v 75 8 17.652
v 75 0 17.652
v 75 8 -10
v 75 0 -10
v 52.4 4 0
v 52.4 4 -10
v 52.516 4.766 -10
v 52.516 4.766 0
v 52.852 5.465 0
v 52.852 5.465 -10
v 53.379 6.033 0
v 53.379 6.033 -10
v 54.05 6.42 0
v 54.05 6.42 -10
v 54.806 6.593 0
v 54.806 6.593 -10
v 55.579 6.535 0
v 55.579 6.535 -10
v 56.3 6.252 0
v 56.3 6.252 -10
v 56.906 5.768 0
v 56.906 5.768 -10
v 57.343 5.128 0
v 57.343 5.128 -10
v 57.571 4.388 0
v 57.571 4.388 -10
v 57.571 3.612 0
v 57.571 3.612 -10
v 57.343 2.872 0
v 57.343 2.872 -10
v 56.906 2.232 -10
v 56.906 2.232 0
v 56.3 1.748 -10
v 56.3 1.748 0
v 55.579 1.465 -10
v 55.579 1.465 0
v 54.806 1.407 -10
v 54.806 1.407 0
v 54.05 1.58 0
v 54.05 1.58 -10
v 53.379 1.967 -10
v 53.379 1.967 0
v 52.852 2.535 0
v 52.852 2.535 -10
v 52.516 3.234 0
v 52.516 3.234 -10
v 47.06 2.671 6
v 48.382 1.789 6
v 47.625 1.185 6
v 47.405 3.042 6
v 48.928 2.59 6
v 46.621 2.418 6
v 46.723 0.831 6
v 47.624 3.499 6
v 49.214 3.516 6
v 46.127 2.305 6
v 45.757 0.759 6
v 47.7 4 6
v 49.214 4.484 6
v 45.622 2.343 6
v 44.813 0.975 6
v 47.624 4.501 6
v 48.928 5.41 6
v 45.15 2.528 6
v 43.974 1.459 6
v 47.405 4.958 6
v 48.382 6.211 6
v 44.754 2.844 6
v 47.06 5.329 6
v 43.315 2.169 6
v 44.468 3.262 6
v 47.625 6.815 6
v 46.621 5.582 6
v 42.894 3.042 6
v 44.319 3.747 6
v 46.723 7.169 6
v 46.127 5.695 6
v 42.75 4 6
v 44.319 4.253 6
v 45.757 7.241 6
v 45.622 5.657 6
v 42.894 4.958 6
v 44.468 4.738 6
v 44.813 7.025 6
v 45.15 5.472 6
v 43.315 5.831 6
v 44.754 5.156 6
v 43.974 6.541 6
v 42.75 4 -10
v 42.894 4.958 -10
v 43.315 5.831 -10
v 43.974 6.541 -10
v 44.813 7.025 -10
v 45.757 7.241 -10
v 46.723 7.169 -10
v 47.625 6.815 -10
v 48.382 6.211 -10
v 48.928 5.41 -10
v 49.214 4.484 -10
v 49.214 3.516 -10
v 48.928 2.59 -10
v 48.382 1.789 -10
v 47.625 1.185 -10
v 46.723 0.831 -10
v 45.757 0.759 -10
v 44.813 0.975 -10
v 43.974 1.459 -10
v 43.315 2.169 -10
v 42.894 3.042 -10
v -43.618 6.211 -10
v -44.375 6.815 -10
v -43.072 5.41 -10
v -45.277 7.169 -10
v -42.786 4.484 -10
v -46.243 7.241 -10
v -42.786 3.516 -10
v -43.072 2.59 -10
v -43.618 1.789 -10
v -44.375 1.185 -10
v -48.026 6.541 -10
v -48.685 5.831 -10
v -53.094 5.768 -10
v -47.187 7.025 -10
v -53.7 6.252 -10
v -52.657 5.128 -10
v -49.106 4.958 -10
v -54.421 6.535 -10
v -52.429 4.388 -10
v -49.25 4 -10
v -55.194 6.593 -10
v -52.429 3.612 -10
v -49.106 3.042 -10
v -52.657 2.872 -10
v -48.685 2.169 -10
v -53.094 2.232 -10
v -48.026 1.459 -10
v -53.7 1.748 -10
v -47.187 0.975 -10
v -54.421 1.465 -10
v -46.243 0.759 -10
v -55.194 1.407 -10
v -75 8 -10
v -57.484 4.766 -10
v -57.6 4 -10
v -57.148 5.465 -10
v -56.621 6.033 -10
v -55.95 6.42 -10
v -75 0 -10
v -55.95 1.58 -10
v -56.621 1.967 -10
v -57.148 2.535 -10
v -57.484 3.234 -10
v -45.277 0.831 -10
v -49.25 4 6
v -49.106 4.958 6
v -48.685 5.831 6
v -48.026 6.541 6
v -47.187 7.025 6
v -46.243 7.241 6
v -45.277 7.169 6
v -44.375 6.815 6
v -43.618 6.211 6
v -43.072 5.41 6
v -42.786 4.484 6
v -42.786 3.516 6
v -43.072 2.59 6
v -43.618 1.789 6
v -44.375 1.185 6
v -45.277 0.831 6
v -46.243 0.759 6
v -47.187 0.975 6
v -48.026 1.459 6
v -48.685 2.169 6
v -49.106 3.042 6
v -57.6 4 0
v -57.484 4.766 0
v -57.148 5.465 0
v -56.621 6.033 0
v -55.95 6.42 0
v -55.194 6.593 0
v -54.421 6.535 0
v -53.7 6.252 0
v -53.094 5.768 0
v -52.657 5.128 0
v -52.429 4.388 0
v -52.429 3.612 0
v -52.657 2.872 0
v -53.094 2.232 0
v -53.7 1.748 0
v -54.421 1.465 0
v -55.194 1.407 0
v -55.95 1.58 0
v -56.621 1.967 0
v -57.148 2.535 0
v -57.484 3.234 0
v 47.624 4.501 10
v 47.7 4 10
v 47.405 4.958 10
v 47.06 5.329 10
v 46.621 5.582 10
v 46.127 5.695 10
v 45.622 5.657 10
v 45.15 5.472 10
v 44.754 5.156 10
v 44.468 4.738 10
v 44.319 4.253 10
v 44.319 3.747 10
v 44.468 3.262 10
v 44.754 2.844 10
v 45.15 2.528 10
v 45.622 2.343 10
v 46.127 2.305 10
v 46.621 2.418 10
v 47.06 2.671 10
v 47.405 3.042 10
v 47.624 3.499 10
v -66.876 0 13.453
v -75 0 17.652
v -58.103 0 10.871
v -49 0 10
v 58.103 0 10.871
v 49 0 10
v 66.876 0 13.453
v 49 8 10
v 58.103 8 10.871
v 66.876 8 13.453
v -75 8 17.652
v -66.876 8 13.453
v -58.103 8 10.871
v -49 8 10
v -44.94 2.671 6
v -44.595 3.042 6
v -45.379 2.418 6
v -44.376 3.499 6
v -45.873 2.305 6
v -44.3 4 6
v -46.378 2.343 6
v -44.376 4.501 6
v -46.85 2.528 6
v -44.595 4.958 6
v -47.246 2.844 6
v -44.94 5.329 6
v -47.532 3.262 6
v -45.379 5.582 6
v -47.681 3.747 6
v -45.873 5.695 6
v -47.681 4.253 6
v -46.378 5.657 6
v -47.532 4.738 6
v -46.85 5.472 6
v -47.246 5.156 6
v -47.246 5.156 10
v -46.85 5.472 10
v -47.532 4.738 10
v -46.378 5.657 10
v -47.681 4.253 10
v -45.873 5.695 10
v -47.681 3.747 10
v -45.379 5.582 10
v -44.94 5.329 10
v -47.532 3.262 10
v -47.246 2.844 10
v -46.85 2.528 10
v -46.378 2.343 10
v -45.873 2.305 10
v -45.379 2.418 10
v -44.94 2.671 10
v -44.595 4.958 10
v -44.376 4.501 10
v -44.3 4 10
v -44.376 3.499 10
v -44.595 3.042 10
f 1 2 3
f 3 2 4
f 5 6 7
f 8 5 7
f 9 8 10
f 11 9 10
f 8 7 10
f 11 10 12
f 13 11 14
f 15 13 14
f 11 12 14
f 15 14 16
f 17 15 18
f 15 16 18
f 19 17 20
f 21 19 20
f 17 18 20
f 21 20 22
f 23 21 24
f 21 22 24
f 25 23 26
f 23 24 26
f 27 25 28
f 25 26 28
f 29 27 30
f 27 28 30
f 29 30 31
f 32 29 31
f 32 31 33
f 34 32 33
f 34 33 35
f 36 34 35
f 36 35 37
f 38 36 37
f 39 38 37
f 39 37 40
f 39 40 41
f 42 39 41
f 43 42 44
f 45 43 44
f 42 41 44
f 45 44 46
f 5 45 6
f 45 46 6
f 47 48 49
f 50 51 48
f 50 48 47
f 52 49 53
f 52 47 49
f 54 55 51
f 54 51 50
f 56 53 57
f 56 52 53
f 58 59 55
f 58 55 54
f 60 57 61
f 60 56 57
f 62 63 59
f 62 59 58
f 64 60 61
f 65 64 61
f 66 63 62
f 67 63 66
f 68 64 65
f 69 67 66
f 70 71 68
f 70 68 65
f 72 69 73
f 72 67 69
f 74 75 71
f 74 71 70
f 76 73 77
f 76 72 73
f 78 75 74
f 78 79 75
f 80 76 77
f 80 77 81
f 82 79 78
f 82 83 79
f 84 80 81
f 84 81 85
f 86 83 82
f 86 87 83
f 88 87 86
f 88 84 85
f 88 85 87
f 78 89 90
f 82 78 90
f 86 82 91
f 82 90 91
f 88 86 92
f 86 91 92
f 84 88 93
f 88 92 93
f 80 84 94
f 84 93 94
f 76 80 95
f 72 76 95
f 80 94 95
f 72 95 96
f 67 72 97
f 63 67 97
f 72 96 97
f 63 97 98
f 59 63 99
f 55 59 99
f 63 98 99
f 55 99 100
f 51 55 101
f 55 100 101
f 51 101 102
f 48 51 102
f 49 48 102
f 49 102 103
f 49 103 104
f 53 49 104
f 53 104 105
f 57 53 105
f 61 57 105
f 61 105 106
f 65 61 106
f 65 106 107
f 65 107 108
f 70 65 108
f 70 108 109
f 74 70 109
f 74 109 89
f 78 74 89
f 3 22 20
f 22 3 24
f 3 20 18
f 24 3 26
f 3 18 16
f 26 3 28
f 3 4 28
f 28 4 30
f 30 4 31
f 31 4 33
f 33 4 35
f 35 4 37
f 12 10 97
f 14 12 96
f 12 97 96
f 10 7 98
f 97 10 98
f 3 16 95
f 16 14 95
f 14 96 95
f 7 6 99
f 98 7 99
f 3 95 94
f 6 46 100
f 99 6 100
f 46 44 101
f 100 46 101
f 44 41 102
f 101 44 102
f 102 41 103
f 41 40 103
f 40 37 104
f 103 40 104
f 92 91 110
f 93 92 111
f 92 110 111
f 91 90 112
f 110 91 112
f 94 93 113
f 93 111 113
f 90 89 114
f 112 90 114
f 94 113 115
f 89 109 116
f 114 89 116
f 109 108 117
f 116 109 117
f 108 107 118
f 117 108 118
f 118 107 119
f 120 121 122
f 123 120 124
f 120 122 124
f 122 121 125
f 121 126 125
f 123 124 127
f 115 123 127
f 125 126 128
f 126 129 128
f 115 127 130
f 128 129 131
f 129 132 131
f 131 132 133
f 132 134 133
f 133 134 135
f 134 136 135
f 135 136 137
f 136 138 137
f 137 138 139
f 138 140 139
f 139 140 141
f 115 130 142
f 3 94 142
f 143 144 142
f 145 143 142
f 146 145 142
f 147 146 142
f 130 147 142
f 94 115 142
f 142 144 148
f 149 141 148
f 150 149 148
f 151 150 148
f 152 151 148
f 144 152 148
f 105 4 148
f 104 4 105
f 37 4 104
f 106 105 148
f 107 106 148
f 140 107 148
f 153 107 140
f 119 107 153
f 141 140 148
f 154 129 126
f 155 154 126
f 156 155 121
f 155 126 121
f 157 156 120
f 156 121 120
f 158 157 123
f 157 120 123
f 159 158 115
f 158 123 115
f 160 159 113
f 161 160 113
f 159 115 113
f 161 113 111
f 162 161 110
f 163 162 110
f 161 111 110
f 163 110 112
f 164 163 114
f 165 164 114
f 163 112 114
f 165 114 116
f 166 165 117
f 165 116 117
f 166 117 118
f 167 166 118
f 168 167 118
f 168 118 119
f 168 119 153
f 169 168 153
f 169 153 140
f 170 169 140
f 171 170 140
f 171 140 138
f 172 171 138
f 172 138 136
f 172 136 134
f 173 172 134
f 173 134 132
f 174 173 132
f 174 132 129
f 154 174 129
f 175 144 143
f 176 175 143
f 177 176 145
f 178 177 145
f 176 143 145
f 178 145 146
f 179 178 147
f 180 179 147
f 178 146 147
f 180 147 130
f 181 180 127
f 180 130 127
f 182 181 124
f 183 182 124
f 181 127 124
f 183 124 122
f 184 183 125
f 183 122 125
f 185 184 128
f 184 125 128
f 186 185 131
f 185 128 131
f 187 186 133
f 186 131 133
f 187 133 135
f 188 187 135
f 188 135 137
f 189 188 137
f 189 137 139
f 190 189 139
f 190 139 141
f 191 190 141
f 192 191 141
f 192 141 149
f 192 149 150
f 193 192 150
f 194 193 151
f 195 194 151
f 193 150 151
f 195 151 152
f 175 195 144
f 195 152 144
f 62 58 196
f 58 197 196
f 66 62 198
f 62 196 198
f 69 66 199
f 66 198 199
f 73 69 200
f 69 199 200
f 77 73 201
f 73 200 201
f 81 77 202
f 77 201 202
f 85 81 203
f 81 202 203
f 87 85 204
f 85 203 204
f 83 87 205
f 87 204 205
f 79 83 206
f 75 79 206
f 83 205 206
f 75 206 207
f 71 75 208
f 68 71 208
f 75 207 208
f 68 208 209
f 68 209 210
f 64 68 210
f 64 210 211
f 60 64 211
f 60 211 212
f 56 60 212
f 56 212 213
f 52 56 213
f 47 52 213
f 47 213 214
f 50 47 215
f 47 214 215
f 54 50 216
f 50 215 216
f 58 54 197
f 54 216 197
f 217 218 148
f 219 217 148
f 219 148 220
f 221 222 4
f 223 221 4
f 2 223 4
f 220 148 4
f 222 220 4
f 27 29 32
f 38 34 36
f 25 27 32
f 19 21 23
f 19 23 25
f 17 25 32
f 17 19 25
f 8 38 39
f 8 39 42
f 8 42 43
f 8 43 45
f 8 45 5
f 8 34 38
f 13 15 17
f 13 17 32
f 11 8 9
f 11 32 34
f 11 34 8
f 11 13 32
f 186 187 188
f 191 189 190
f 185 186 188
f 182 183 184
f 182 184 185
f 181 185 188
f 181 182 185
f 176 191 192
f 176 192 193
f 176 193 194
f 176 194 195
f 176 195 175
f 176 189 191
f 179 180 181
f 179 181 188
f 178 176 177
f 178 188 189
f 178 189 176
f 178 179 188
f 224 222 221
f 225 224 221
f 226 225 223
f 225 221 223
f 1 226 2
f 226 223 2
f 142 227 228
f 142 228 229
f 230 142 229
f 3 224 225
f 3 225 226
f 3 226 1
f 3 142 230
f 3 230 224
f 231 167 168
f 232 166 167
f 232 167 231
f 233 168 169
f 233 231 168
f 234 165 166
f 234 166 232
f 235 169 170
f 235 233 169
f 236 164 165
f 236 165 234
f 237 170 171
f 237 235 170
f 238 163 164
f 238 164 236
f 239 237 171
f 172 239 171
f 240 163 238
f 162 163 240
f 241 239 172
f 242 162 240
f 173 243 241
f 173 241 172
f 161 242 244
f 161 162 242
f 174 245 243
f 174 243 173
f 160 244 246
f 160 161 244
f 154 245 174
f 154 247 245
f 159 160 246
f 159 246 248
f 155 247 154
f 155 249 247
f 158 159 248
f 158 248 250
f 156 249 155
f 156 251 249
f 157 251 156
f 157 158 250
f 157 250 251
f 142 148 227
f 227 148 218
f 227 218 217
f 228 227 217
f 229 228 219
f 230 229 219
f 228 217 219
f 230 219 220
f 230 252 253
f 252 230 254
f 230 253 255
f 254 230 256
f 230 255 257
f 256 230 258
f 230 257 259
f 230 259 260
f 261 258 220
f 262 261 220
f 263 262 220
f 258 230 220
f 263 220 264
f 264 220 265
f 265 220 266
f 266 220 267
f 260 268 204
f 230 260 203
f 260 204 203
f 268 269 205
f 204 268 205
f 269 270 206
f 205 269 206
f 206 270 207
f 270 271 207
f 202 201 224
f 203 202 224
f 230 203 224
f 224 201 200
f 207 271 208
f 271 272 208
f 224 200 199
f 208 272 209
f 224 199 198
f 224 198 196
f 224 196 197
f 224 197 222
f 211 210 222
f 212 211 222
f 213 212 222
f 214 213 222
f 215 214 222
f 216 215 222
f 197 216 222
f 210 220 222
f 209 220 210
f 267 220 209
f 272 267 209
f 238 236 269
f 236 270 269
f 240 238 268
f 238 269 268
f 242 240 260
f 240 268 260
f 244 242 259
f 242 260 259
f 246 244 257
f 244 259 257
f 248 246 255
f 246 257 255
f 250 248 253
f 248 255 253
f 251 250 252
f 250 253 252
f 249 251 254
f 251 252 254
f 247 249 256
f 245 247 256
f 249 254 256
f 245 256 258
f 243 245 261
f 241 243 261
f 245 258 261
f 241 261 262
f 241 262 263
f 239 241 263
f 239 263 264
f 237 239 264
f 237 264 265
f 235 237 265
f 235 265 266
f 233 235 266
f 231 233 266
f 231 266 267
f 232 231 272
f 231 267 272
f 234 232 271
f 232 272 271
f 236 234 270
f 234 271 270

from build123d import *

# Parameters (mm, degrees)
EXTRUDE_1_DEPTH              = 8
HOLE_WIZARD_M3_1_D           = 3.4
HOLE_WIZARD_M3_1_CBORE_D     = 6.5
HOLE_WIZARD_M3_1_CBORE_DEPTH = 16
SKETCH_4_R                   = 2.6
CUT_EXTRUDE_1_DEPTH          = 10


with BuildPart() as part:
    # 草图1 → 凸台-拉伸1 (new body)
    with BuildSketch(Plane(origin=(0, 0, 0), x_dir=(1, 0, 0), z_dir=(0, 1, 0))):
        Polygon((-75, -10), (-49, -10), (49, -10), (75, -10), (75, 10), (-75, 10), align=None)
        with BuildLine():
            ThreePointArc((-75, -17.651517996), (-62.551252042, -11.952594339), (-49, -10))
            Line((-49, -10), (-75, -10))
            Line((-75, -10), (-75, -17.651517996))
        make_face()
        with BuildLine():
            Line((75, -10), (49, -10))
            ThreePointArc((49, -10), (62.551252042, -11.952594339), (75, -17.651517996))
            Line((75, -17.651517996), (75, -10))
        make_face()
    extrude(amount=EXTRUDE_1_DEPTH)

    # M3 六角凹头螺钉的柱形沉头孔1 (through all)
    with Locations(Plane(origin=(46, 4, -10), x_dir=(-1, 0, 0), z_dir=(0, 0, -1))):
        with Locations((0, 0), (92, 0)):
            CounterBoreHole(HOLE_WIZARD_M3_1_D / 2, HOLE_WIZARD_M3_1_CBORE_D / 2, HOLE_WIZARD_M3_1_CBORE_DEPTH)

    # 草图4 → 切除-拉伸1 (cut)
    with BuildSketch(Plane(origin=(0, 0, -10), x_dir=(-1, 0, 0), z_dir=(0, 0, -1))):
        with Locations((-55, 4)):
            Circle(SKETCH_4_R)
        with Locations((55, 4)):
            Circle(SKETCH_4_R)
    extrude(amount=-CUT_EXTRUDE_1_DEPTH, mode=Mode.SUBTRACT)


solid = part.part
